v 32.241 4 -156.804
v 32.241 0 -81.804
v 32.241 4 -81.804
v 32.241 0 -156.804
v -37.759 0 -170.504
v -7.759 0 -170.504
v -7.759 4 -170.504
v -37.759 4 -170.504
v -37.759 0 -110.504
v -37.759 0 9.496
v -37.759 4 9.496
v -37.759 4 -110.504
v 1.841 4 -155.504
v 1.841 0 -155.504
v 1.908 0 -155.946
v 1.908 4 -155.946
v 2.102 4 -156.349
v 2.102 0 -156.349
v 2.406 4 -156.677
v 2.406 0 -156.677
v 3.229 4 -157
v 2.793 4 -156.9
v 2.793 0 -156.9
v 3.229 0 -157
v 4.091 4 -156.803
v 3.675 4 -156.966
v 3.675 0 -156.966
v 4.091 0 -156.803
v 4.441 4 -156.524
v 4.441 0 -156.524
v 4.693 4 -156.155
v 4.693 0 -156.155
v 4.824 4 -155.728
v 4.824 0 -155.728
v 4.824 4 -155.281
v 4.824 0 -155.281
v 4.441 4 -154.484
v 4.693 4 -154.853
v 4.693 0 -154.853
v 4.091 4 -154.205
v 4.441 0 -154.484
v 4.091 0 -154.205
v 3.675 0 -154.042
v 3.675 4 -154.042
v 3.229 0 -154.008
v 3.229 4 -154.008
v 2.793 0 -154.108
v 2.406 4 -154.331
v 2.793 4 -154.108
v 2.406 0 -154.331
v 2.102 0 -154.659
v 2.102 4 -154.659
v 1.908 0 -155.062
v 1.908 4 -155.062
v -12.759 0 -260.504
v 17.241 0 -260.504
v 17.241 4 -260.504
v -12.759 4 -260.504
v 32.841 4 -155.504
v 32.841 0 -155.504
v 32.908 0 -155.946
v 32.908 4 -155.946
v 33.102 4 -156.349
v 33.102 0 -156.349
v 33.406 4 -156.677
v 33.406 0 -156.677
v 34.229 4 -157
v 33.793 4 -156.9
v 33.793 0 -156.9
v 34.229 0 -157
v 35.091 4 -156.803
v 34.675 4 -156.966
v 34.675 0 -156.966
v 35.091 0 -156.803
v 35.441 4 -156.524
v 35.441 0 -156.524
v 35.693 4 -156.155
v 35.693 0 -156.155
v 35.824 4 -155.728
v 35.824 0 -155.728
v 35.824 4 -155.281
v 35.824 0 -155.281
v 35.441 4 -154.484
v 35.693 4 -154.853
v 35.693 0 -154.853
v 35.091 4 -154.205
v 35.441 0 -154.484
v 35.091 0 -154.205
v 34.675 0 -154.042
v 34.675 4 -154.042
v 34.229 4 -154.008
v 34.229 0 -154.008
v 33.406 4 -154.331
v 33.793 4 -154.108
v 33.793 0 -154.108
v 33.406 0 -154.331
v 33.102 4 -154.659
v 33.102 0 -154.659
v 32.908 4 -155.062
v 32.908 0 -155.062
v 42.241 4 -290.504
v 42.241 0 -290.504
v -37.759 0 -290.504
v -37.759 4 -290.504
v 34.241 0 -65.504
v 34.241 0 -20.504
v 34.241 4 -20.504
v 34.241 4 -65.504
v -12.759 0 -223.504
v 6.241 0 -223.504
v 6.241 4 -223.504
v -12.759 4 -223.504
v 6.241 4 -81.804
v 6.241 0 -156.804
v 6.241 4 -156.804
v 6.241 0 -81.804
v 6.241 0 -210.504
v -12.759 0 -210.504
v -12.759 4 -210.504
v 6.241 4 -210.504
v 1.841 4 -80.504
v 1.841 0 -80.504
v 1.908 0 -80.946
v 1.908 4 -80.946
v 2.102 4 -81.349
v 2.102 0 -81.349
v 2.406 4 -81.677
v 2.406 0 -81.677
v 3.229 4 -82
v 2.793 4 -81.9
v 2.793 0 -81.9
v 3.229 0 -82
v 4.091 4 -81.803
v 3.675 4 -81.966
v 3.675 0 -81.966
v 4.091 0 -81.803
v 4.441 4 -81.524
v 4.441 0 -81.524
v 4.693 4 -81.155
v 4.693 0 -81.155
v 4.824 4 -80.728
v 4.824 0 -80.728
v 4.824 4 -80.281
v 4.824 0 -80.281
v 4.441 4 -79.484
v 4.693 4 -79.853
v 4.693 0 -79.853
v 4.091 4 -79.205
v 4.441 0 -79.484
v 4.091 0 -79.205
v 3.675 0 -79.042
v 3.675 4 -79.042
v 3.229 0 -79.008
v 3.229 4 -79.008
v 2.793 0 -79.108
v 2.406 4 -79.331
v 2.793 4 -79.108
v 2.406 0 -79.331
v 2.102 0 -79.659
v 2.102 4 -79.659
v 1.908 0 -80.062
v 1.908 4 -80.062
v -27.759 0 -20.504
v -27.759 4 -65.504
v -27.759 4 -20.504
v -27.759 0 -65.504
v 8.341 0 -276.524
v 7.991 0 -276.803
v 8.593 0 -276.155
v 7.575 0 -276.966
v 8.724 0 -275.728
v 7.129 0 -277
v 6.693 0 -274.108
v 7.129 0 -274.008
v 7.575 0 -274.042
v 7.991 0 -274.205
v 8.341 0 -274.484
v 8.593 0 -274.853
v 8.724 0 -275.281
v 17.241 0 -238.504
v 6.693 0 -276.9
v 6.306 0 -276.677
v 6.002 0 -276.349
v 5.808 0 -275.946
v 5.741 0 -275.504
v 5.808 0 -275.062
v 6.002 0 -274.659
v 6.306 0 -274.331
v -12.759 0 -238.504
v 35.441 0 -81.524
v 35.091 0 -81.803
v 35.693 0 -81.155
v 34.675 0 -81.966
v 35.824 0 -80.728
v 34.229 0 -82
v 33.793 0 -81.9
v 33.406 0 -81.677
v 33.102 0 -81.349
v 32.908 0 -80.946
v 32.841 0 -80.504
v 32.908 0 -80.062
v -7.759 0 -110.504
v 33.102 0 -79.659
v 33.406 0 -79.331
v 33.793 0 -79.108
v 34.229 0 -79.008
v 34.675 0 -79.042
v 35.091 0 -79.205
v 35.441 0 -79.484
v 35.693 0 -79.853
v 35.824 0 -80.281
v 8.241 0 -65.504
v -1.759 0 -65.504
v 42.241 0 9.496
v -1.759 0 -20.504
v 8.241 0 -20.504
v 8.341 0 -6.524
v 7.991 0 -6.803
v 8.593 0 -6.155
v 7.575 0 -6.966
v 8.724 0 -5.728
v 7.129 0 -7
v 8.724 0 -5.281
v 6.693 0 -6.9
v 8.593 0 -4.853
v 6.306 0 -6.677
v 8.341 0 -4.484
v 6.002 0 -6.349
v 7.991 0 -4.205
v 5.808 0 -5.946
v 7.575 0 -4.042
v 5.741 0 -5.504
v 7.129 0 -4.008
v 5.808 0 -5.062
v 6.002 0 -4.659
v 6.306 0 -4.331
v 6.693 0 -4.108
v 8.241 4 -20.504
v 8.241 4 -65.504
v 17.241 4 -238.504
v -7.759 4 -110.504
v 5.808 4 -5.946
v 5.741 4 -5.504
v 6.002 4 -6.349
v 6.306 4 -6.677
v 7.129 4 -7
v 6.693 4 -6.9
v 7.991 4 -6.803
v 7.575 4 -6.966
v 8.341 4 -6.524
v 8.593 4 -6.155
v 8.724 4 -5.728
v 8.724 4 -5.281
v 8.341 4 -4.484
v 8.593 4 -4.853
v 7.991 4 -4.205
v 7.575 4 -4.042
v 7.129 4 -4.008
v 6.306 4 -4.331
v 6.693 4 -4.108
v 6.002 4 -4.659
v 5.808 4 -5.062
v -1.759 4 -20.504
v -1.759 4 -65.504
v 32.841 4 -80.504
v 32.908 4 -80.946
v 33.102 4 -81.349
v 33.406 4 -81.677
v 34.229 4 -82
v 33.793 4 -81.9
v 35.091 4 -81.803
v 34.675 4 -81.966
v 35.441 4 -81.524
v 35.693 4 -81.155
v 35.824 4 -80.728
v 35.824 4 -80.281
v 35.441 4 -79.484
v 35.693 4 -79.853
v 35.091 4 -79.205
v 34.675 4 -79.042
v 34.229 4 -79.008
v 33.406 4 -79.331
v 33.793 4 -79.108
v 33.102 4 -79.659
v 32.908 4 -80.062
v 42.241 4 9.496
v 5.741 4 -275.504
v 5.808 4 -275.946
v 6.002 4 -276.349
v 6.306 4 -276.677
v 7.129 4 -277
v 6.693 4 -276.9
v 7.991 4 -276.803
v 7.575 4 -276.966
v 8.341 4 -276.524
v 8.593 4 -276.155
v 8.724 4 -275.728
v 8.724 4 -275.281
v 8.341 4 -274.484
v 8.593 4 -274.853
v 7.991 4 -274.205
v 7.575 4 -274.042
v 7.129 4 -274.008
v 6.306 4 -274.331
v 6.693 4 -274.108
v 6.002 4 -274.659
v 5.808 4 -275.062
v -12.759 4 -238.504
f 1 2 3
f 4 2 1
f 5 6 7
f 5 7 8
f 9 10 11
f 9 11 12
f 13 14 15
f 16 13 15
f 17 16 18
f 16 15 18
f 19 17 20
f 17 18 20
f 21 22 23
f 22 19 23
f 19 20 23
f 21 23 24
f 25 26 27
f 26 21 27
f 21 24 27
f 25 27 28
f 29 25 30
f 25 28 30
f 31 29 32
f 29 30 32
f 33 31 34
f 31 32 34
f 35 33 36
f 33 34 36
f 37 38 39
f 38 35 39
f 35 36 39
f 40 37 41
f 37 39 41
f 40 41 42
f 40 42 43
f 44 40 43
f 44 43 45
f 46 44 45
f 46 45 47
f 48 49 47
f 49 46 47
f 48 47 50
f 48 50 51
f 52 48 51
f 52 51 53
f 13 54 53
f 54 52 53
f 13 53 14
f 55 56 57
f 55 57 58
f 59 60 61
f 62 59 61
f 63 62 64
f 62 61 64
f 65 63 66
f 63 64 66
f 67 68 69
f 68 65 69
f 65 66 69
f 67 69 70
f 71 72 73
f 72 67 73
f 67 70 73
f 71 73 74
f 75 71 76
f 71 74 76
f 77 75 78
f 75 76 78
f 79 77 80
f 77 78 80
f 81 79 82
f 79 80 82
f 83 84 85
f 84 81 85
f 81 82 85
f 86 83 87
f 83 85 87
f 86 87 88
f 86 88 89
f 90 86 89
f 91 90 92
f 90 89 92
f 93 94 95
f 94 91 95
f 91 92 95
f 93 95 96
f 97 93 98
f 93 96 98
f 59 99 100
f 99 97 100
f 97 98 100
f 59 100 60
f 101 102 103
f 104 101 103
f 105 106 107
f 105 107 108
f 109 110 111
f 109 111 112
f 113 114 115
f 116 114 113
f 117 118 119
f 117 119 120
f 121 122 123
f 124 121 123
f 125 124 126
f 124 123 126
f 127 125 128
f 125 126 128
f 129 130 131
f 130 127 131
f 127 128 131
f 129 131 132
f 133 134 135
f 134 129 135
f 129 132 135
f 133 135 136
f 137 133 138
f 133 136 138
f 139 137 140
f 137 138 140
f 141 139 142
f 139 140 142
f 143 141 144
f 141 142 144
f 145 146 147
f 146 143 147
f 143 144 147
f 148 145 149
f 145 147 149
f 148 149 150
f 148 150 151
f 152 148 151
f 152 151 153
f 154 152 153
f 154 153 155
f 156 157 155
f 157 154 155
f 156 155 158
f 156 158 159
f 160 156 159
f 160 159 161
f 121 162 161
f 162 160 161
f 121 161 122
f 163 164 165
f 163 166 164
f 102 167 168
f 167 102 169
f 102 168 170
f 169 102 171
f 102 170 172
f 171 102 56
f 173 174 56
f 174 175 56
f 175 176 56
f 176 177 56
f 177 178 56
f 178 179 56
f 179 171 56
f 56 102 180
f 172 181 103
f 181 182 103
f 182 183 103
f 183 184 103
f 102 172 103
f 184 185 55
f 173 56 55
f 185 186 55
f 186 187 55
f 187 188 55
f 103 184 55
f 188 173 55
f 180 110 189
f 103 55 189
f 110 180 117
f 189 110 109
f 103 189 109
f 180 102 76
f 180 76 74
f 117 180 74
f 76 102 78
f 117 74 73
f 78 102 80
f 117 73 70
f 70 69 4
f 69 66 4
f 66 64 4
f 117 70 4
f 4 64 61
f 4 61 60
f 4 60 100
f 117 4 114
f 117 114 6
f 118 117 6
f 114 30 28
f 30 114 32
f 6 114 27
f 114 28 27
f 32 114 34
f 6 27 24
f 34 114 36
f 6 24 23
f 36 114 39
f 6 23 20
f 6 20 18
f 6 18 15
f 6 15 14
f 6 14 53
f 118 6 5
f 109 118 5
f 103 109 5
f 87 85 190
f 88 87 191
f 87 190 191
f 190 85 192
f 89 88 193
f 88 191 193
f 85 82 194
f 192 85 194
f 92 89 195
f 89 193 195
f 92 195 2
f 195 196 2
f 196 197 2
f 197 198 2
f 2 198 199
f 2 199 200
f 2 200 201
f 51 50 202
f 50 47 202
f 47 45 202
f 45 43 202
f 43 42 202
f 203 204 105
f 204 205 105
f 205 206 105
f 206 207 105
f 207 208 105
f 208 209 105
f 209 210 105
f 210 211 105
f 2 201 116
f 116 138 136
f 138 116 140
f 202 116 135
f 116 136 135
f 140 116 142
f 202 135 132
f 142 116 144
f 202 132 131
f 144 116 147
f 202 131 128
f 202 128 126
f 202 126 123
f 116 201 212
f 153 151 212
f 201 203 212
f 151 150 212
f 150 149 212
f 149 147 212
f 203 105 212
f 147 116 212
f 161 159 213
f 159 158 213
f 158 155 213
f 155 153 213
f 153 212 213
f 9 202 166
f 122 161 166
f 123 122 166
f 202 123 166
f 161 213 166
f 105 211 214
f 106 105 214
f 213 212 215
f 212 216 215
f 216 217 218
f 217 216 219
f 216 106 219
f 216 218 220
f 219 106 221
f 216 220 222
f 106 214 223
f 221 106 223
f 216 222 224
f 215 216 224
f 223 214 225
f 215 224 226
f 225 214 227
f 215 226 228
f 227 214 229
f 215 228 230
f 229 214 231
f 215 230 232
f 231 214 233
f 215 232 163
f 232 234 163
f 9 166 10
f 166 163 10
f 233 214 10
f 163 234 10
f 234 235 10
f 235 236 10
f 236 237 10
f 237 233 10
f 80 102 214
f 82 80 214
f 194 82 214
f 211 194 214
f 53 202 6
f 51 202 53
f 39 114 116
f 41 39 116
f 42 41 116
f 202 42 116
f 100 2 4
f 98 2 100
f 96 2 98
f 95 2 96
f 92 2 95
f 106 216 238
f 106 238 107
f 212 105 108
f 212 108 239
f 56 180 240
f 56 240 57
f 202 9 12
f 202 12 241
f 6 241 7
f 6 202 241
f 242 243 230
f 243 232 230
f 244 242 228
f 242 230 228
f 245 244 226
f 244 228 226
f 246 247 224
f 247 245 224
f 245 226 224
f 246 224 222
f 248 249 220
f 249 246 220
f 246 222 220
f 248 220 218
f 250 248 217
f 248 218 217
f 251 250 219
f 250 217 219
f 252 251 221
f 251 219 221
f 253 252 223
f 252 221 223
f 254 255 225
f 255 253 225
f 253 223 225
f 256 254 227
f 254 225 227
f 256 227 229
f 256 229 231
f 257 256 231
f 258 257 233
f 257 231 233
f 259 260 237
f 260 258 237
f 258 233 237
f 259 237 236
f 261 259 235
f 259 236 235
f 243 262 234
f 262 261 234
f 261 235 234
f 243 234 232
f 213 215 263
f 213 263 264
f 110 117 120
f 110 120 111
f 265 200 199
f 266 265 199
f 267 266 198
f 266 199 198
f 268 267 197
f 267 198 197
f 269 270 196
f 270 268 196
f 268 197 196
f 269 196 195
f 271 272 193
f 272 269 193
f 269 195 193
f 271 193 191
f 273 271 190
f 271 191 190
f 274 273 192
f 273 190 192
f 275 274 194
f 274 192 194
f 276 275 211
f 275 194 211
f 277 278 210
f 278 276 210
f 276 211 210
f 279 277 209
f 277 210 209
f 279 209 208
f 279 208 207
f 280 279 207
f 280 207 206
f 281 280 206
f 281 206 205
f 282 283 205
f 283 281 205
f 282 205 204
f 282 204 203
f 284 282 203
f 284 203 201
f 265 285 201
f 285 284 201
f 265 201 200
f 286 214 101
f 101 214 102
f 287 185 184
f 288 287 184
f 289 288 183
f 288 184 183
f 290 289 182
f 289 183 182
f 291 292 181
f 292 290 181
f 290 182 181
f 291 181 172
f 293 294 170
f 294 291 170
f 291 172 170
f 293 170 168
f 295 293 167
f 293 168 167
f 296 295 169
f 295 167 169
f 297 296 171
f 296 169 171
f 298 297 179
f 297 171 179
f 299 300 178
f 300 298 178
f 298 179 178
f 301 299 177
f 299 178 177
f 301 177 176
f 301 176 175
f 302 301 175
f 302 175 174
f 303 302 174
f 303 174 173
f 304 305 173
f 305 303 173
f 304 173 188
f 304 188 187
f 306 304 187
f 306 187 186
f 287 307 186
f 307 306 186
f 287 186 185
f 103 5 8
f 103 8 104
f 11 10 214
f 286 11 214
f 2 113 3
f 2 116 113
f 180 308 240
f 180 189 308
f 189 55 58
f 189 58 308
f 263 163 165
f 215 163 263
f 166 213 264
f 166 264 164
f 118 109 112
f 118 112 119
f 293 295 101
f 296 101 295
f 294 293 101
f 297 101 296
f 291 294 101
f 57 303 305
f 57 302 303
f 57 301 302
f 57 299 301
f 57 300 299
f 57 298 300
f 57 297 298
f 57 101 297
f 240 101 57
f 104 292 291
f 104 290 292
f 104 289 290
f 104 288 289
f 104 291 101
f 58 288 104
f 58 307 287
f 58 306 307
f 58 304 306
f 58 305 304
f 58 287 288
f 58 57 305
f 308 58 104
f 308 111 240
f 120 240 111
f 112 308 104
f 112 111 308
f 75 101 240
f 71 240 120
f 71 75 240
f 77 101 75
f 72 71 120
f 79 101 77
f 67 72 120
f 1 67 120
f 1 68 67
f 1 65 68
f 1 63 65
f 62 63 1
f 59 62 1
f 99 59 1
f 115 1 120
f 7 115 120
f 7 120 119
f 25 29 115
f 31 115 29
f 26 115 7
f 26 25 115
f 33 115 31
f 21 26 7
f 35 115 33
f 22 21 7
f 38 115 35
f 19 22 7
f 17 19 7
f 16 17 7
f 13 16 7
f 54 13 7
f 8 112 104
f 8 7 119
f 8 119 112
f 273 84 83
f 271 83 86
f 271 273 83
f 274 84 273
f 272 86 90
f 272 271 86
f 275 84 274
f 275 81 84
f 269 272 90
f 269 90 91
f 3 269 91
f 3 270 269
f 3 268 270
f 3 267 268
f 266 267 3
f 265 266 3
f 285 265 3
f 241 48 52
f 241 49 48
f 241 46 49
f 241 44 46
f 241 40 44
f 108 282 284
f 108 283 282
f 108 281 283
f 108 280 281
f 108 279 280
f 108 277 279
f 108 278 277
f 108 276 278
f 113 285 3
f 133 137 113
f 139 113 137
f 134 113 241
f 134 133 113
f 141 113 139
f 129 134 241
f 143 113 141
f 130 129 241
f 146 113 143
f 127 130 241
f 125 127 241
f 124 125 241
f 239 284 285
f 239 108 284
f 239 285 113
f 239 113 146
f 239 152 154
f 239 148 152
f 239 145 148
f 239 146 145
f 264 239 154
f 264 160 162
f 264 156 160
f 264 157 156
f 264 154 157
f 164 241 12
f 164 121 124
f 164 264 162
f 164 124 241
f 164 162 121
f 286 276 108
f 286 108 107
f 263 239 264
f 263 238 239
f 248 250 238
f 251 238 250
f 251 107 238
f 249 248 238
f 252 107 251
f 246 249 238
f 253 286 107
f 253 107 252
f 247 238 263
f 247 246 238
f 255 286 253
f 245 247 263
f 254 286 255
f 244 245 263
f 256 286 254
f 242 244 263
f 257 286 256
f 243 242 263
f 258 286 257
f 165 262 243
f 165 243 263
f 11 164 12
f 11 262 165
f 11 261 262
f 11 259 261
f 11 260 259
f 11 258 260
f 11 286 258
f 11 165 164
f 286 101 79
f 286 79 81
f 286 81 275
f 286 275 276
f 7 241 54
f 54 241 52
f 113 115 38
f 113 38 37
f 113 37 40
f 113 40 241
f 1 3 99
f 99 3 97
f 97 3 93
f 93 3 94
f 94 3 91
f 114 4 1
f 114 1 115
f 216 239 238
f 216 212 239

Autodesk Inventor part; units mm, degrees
ref_plane "YZ Plane" through (0, 0, 0) normal (1, 0, 0) x (0, 1, 0)
ref_plane "XZ Plane" through (0, 0, 0) normal (0, 1, 0) x (-1, 0, 0)
ref_plane "XY Plane" through (0, 0, 0) normal (0, 0, 1) x (1, 0, 0)
sketch "Sketch1" plane through (0, 0, 0) normal (0, 1, 0) x (-1, 0, 0)
  line L0 (37.7589, 9.4959) -> (-42.2411, 9.4959)
  line L1 (-42.2411, 9.4959) -> (-42.2411, -290.5041)
  line L2 (-42.2411, -290.5041) -> (37.7589, -290.5041)
  line L3 (27.7589, -20.5041) -> (1.7589, -20.5041)
  line L4 (1.7589, -20.5041) -> (1.7589, -65.5041)
  line L5 (1.7589, -65.5041) -> (27.7589, -65.5041)
  line L6 (27.7589, -65.5041) -> (27.7589, -20.5041)
  line L7 (-8.2411, -20.5041) -> (-34.2411, -20.5041)
  line L8 (-34.2411, -20.5041) -> (-34.2411, -65.5041)
  line L9 (-34.2411, -65.5041) -> (-8.2411, -65.5041)
  line L10 (-8.2411, -65.5041) -> (-8.2411, -20.5041)
  line L11 (-6.2411, -81.8041) -> (-32.2411, -81.8041)
  line L12 (-32.2411, -81.8041) -> (-32.2411, -156.8041)
  line L13 (-32.2411, -156.8041) -> (-6.2411, -156.8041)
  line L14 (-6.2411, -156.8041) -> (-6.2411, -81.8041)
  circle A0 centre (-3.3411, -80.5041) radius 1.5
  circle A1 centre (-34.3411, -80.5041) radius 1.5
  circle A2 centre (-3.3411, -155.5041) radius 1.5
  circle A3 centre (-34.3411, -155.5041) radius 1.5
  line L15 (37.7589, 9.4959) -> (37.7589, -110.5041)
  line L16 (37.7589, -110.5041) -> (7.7589, -110.5041)
  line L17 (7.7589, -110.5041) -> (7.7589, -170.5041)
  line L18 (7.7589, -170.5041) -> (37.7589, -170.5041)
  line L19 (37.7589, -170.5041) -> (37.7589, -290.5041)
  line L20 (12.7589, -238.5041) -> (-17.2411, -238.5041)
  line L21 (-17.2411, -238.5041) -> (-17.2411, -260.5041)
  line L22 (-17.2411, -260.5041) -> (12.7589, -260.5041)
  line L23 (12.7589, -260.5041) -> (12.7589, -238.5041)
  line L24 (12.7589, -210.5041) -> (-6.2411, -210.5041)
  line L25 (-6.2411, -210.5041) -> (-6.2411, -223.5041)
  line L26 (-6.2411, -223.5041) -> (12.7589, -223.5041)
  line L27 (12.7589, -223.5041) -> (12.7589, -210.5041)
  circle A4 centre (-7.2411, -275.5041) radius 1.5
  circle A5 centre (-7.2411, -5.5041) radius 1.5
  point P0 (0, 0)
  dimension "d0" = 300
  dimension "d1" = 80
  dimension "d4" = 45
  dimension "d5" = 26
  dimension "d6" = 30
  dimension "d8" = 45
  dimension "d9" = 26
  dimension "d10" = 30
  dimension "d11" = 10
  dimension "d12" = 75
  dimension "d13" = 26
  dimension "d16" = 1.3
  dimension "d17" = 2.9
  dimension "d18" = 3
  dimension "d20" = 31
  dimension "d22" = 3
  dimension "d23" = 75
  dimension "d24" = 3
  dimension "d25" = 75
  dimension "d26" = 3
  dimension "d27" = 15
  dimension "d28" = 10
  dimension "d29" = 120
  dimension "d30" = 120
  dimension "d31" = 30
  dimension "d32" = 22
  dimension "d33" = 30
  dimension "d34" = 25
  dimension "d35" = 30
  dimension "d36" = 13
  dimension "d37" = 19
  dimension "d38" = 25
  dimension "d39" = 15
  dimension "d40" = 45
  dimension "d41" = 15
  dimension "d42" = 3
  dimension "d43" = 45
  dimension "d44" = 15
  dimension "d45" = 3
extrude "Extrusion1" add sketch "Sketch1" along normal blind 4
properties part number "support_arriere"
